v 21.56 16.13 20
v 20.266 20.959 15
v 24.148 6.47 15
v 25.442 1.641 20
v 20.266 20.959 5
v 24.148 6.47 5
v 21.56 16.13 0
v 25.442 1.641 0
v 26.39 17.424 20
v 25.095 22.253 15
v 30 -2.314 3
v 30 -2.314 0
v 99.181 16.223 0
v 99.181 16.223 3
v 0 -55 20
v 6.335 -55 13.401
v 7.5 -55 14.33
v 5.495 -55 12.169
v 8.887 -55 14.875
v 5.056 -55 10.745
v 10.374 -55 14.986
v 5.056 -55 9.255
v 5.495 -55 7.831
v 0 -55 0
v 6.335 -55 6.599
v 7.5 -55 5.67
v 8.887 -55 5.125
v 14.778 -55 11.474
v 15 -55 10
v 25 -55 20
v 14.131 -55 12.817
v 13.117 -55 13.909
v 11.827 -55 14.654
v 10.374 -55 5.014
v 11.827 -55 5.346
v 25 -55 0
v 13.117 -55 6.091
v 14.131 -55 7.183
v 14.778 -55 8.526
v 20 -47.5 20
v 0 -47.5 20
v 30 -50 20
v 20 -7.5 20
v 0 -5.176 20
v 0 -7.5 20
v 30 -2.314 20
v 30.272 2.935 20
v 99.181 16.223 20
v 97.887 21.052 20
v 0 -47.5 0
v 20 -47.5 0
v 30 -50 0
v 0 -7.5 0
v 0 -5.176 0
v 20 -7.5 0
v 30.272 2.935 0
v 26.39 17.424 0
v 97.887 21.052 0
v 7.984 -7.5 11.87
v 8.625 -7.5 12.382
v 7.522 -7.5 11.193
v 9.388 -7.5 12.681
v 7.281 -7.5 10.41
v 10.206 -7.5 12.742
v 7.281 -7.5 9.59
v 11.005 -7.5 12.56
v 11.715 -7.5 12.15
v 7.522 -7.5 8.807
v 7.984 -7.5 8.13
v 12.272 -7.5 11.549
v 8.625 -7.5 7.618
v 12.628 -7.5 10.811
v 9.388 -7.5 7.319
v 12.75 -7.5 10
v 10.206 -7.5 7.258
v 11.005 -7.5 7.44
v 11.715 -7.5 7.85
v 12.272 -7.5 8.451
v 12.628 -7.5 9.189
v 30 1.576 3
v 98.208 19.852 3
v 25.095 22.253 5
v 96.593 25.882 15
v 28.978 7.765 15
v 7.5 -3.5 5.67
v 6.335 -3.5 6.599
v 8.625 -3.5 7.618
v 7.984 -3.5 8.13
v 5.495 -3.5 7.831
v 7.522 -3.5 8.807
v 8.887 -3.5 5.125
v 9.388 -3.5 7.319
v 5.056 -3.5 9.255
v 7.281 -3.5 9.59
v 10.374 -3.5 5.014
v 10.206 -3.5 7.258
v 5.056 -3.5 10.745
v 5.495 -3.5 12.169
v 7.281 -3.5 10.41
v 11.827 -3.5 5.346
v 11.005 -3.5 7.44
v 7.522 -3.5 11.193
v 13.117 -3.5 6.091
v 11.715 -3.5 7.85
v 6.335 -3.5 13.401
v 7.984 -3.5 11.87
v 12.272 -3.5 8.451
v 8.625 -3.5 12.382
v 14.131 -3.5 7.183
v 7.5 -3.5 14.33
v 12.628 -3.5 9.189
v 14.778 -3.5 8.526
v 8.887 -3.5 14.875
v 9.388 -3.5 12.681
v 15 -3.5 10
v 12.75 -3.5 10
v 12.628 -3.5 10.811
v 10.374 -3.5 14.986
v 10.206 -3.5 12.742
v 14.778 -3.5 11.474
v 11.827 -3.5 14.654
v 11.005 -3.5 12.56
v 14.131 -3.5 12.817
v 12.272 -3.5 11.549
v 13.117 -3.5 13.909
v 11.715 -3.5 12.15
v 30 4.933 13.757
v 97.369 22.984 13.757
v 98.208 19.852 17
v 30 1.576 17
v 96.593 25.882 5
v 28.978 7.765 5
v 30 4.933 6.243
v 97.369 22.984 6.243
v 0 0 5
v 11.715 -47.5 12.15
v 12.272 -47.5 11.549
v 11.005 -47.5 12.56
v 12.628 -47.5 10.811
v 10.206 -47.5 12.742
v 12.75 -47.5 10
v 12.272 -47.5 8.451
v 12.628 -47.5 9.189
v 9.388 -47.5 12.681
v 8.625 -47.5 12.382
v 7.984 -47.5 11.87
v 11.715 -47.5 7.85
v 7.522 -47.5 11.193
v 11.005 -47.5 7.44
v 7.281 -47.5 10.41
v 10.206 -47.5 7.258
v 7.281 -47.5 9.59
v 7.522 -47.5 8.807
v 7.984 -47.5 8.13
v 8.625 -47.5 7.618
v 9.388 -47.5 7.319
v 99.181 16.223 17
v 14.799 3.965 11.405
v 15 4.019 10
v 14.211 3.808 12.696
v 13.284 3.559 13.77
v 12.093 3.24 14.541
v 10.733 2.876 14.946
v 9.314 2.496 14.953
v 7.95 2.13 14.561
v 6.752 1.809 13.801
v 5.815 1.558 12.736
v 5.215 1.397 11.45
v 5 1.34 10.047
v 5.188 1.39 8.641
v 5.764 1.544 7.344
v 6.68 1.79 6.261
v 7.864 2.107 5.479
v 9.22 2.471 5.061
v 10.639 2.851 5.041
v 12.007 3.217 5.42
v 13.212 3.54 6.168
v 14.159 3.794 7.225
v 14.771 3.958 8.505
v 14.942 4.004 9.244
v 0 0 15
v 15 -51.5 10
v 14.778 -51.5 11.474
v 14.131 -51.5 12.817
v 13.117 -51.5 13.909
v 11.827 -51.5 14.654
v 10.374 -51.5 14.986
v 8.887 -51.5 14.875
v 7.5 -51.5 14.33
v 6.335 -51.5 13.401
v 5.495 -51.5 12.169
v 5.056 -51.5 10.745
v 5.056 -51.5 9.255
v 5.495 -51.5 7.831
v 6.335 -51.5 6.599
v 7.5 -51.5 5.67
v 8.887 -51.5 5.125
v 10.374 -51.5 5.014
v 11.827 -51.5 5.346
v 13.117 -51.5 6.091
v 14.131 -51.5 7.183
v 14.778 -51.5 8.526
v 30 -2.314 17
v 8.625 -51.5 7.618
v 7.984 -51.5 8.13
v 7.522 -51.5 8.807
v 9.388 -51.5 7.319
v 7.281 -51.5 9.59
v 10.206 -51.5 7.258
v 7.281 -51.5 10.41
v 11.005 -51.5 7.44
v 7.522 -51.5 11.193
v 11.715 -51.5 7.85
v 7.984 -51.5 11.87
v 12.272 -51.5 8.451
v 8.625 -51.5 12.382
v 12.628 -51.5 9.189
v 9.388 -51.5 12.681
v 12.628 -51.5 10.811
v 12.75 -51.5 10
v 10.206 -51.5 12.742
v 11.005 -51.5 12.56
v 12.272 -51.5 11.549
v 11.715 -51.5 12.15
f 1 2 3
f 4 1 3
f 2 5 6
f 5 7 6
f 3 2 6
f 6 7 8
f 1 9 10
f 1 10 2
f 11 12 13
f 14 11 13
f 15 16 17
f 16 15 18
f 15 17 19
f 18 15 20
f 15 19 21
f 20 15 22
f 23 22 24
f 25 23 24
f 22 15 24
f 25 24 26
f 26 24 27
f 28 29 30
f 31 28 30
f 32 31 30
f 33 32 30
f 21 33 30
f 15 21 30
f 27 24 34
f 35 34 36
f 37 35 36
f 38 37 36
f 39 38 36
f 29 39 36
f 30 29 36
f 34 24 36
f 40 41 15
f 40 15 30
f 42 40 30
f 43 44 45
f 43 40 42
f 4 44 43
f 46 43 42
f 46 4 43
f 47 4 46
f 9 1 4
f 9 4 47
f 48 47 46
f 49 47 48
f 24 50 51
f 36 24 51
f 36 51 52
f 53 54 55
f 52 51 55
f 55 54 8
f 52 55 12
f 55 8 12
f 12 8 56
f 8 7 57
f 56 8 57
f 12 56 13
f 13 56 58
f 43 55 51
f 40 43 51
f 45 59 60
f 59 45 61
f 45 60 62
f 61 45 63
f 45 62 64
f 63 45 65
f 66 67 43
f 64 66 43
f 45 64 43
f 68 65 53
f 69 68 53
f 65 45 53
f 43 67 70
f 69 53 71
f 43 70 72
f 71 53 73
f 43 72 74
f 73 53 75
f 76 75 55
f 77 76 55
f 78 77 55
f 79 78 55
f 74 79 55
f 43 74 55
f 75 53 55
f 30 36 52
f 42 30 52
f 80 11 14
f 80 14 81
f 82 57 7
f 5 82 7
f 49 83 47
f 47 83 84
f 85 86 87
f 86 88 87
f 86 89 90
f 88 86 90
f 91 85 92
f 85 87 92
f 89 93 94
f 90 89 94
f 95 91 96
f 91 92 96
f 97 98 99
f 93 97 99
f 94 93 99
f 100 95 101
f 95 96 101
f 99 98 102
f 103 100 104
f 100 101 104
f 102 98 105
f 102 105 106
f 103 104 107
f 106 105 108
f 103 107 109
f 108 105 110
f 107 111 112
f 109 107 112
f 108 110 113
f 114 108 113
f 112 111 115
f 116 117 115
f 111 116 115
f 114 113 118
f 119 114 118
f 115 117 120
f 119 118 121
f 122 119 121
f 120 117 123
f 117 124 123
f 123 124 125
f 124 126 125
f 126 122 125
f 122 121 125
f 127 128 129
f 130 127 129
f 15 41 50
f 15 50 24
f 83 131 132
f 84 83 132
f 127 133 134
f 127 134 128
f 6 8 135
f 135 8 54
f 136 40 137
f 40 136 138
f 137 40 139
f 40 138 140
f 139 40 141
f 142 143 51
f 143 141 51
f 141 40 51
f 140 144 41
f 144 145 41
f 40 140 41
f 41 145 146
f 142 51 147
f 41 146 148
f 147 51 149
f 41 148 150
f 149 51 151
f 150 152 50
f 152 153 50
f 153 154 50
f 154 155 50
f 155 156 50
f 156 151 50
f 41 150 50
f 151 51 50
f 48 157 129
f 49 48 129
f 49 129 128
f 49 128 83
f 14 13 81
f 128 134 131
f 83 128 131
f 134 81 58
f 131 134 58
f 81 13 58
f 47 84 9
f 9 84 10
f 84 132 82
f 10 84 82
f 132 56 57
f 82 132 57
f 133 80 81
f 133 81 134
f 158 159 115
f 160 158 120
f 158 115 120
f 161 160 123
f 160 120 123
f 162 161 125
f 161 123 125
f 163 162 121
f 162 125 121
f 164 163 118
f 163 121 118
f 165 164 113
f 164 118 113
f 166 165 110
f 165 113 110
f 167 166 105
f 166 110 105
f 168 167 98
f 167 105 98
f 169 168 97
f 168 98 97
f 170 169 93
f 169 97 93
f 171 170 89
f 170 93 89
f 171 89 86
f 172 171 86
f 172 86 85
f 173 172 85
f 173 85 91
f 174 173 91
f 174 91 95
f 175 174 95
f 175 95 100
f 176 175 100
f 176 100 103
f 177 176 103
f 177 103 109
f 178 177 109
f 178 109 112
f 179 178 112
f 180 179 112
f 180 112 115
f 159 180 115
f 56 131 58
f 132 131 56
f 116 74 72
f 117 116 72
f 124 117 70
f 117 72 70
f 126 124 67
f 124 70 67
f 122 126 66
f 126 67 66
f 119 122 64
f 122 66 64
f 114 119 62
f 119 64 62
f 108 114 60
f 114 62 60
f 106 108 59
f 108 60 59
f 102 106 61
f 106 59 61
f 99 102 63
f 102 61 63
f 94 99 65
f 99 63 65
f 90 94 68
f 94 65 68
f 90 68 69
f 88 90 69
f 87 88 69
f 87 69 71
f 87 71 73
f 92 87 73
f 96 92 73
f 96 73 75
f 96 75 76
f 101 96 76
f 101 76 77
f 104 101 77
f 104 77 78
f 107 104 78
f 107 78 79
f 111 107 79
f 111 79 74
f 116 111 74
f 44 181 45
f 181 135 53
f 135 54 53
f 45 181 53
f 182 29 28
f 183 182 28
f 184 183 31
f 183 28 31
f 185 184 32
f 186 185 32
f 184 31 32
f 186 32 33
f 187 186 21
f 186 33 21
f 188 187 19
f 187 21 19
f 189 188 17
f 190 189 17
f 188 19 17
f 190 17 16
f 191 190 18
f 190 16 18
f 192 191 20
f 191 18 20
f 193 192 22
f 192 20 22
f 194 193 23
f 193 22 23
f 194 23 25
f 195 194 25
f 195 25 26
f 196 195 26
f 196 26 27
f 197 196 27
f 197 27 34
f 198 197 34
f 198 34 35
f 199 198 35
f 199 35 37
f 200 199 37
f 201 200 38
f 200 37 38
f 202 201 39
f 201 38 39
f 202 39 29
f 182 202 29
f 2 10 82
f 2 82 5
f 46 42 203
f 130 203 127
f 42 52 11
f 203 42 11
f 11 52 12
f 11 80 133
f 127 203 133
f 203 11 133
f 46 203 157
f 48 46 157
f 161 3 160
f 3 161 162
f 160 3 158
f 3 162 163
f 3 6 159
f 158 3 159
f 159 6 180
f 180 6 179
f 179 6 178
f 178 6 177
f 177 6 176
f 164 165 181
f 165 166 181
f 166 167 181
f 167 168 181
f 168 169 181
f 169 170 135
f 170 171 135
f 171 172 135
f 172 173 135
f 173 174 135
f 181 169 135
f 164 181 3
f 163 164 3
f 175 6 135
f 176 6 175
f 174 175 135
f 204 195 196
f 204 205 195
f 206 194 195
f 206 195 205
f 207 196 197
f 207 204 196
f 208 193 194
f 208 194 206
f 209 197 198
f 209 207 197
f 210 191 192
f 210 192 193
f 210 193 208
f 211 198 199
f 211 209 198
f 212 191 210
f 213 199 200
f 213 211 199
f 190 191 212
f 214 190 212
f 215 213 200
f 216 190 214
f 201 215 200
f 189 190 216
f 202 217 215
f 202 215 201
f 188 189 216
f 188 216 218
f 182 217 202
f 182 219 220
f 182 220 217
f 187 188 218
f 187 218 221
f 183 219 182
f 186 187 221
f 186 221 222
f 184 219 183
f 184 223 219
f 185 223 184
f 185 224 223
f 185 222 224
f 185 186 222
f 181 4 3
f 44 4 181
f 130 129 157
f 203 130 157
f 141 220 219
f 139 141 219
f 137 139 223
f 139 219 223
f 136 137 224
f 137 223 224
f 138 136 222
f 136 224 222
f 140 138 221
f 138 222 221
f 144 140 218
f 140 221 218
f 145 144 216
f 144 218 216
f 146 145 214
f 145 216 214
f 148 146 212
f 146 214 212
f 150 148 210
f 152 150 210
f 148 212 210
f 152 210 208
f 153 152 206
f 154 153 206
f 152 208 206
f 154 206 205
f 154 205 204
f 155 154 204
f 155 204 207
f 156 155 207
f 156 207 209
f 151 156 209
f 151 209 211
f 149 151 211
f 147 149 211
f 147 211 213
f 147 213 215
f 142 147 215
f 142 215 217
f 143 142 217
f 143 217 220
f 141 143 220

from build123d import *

# Parameters (mm, degrees)
F1_DEPTH  = 20
F2_R      = 2.75
F3_DEPTH  = 80.8829045103
F5_R      = 5
F6_DEPTH  = 29.3829045103
F7_R      = 5
F8_DEPTH  = 3.5
F9_SIZE   = 4.99999
F11_REACH = 132.6751363952


# Not quite as in the source:
# - a fillet or chamfer is up to 0.001 mm smaller than in the source, because OpenCascade refuses the exact size


with BuildPart() as f1:
    # F0 (on Top) → F1 (new body)
    with BuildSketch(Plane.XY):
        Polygon((24.1481456572, 6.4704761276), (0, 0), (0, -7.5), (20, -7.5), (20, -47.5), (0, -47.5), (0, -55), (25, -55), (30, -50), (30, -2.3142860312), (99.1807730799, 16.2226462474), (96.5925826289, 25.8819045103), (28.9777747887, 7.7645713531), (25.0954891121, 22.2534587474), (20.2658599807, 20.9593635219), align=None)
    extrude(amount=F1_DEPTH)

    # F2 (on face) → F3 (cut, through all)
    with BuildSketch(Plane.XZ.offset(55)):
        with Locations((10, 10)):
            Circle(F2_R)
    extrude(amount=-F3_DEPTH, mode=Mode.SUBTRACT)

    # F5 (on offset) → F6 (cut, through all)
    with BuildSketch(Plane.XZ.offset(3.5)):
        with Locations((10, 10)):
            Circle(F5_R)
    extrude(amount=-F6_DEPTH, mode=Mode.SUBTRACT)

    # F7 (on face) → F8 (cut)
    with BuildSketch(Plane.XZ.offset(55)):
        with Locations((10, 10)):
            Circle(F7_R)
    extrude(amount=-F8_DEPTH, mode=Mode.SUBTRACT)

    # F9 (size 5 in the source; OpenCascade refuses exactly that, so slightly less here)
    f9_edges = [f1.edges().sort_by_distance(p)[0] for p in [
        (62.785179, 16.823238, 0),
        (62.785179, 16.823238, 20),
        (12.074073, 3.235238, 20),
        (12.074073, 3.235238, 0),
        (22.680675, 21.606411, 20),
        (22.680675, 21.606411, 0),
    ]]
    chamfer(f9_edges, length=F9_SIZE)

    f11_end = Plane(origin=(30, -26.1571430156, 10), x_dir=(0, 0, 1), z_dir=(1, 0, 0))
    # F10 (on face) → F11 (cut, up to a plane its end follows)
    with BuildSketch(Plane(origin=(96.5925826289, 25.8819045103, 0), x_dir=(-0.2588190451, 0.9659258263, 0), z_dir=(0.9659258263, 0.2588190451, 0))):
        Polygon((-3, 13.7573593129), (-6.2426406871, 17), (-15, 17), (-15, 3), (-6.2426406871, 3), (-3, 6.2426406871), align=None)
    f11_long = extrude(amount=-F11_REACH, mode=Mode.PRIVATE)
    add(split(f11_long, bisect_by=f11_end, keep=Keep.TOP, mode=Mode.PRIVATE), mode=Mode.SUBTRACT)


solid = f1.part
